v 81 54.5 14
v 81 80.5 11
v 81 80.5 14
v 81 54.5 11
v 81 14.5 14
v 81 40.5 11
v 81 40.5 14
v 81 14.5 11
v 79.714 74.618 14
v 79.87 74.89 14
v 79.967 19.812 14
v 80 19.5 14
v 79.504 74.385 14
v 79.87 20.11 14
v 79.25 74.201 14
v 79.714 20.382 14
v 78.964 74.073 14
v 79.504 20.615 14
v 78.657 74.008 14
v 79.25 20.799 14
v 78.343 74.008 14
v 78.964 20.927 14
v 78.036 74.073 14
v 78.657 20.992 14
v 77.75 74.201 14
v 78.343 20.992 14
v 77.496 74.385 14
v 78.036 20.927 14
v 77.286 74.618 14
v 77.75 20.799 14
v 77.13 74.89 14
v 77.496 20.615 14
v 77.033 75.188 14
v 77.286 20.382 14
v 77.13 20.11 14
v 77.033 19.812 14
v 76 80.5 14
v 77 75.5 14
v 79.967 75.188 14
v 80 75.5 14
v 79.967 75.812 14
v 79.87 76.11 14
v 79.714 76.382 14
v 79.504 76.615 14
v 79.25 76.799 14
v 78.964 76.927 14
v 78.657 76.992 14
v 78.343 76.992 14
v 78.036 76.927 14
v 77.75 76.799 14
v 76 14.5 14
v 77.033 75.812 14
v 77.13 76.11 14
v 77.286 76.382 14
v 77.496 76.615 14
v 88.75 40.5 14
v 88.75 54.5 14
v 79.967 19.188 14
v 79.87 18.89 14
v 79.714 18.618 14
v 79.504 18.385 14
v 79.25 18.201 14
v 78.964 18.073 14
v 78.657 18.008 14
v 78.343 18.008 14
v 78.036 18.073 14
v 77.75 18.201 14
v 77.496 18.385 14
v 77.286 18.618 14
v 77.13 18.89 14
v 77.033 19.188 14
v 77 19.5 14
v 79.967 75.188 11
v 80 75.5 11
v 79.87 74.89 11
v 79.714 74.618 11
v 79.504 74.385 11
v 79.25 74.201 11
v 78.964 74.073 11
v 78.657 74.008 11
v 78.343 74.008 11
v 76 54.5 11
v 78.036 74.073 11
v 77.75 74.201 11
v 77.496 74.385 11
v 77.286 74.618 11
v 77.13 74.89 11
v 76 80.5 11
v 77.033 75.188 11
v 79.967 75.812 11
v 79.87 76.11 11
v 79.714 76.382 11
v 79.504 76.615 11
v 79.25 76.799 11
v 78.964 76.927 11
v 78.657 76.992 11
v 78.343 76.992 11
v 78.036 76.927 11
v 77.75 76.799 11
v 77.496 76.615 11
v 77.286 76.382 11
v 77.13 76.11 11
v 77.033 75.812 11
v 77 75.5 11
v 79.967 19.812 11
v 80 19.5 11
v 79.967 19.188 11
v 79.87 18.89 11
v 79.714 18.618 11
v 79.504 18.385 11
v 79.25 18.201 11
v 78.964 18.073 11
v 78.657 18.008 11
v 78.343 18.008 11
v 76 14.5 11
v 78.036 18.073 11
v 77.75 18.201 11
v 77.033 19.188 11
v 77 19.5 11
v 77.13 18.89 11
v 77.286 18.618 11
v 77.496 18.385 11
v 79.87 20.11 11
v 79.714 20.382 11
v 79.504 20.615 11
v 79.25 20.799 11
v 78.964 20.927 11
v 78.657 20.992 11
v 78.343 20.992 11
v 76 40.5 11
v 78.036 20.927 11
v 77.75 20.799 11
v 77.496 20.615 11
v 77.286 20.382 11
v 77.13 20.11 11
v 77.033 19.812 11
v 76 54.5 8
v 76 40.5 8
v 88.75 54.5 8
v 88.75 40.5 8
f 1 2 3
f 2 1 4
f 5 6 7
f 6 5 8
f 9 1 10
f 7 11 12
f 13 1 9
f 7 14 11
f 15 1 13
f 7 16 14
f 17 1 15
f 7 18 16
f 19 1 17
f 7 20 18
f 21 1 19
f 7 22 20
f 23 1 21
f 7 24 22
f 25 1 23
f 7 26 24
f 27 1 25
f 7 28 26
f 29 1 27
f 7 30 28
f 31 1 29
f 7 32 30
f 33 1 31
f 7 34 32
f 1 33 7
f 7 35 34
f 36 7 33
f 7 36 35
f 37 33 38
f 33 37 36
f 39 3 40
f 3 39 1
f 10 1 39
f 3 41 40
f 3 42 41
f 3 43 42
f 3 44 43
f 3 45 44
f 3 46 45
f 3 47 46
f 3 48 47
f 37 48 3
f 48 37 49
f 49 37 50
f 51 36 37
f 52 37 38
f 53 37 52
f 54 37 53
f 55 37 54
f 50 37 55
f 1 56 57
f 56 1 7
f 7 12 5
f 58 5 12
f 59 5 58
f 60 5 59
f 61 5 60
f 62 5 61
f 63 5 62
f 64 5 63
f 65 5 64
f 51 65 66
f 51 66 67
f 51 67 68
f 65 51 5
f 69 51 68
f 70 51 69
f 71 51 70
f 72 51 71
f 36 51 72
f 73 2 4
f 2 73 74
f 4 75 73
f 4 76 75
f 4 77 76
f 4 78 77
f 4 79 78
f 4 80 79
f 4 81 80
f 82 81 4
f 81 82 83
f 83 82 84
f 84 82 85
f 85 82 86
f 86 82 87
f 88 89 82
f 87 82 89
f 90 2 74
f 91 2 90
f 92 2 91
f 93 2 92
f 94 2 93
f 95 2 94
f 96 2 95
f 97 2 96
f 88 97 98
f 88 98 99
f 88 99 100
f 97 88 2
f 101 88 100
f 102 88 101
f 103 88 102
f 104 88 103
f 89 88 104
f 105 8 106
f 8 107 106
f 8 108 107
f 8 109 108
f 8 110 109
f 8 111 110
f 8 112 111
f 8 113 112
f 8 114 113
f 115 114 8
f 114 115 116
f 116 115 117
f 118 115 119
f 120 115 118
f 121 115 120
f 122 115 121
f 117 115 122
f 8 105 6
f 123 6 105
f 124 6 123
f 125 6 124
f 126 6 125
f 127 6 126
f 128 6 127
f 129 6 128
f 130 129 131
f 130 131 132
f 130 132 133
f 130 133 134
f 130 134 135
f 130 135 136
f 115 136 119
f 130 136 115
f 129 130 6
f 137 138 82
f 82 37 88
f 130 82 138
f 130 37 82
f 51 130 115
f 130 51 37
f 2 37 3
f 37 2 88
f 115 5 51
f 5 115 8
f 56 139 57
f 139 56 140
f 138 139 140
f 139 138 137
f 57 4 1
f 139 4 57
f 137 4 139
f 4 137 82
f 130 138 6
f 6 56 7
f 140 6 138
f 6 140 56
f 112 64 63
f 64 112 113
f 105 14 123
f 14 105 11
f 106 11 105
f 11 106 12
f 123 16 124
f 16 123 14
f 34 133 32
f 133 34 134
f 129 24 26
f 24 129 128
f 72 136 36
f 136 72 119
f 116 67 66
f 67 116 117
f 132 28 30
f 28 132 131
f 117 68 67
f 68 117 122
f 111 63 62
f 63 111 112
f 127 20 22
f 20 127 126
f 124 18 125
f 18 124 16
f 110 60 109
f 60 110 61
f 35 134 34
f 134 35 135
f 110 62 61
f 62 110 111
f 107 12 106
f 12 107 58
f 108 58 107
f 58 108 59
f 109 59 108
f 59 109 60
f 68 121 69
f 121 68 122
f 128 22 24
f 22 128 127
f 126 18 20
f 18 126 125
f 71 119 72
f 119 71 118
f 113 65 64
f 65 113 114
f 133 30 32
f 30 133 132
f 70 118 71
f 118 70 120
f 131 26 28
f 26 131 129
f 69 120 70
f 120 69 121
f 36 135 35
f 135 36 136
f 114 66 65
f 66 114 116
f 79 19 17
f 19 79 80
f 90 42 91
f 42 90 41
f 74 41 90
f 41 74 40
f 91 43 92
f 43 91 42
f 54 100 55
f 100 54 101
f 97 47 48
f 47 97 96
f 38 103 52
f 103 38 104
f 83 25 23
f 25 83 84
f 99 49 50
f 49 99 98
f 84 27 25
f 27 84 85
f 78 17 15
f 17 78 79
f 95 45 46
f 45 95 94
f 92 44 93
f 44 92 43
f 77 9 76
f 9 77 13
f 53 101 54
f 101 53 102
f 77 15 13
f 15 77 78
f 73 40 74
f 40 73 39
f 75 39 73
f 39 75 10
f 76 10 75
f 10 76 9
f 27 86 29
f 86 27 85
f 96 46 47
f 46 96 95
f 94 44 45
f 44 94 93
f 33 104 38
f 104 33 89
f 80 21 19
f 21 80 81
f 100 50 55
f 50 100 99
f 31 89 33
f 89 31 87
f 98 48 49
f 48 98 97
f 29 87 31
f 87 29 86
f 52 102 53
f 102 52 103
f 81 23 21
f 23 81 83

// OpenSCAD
r = 7;
iw = 136;
ih = 95;
id = 8;

ow = 159.5+1.25;
oh = 109.5+1.25;
od = 3;

sw = 51;
sh = 28;
sd = 6;
st = 4;

hw = 5;
hh = sw+15;
hd = 3;

pw = sw/4;
ph = sh/2;
pd = 3;

/*
union() {
	difference() {
		union() {
			union() {
				translate( [0,r,0] ) cube( [iw, ih-2*r, id] );
				translate( [r,0,0] ) cube( [iw-2*r, ih, id] );
				translate( [r,r,0] ) cylinder( r=r, h=id, $fn=32 );
				translate( [iw-r,r,0] ) cylinder( r=r, h=id, $fn=32 );
				translate( [r,ih-r,0] ) cylinder( r=r, h=id, $fn=32 );
				translate( [iw-r,ih-r,0] ) cylinder( r=r, h=id, $fn=32 );
			}
			
			translate( [(iw-ow)/2,(ih-oh)/2,id] )
			union() {
				translate( [0,r,0] ) cube( [ow, oh-2*r, od] );
				translate( [r,0,0] ) cube( [ow-2*r, oh, od] );
				translate( [r,r,0] ) cylinder( r=r, h=od, $fn=32 );
				translate( [ow-r,r,0] ) cylinder( r=r, h=od, $fn=32 );
				translate( [r,oh-r,0] ) cylinder( r=r, h=od, $fn=32 );
				translate( [ow-r,oh-r,0] ) cylinder( r=r, h=od, $fn=32 );
			}
		}
	
		translate([(iw-sw)/2,(ih-sh)/2,-1])
		cube( [ sw+st+1, sh+st+1, id+od+2 ] );

		for( x=[0:7.5:sw+5] ) {
			translate([x+(iw-sw)/2,(ih-hh)/2+5,-1]) cylinder( r=1.5, h=100, $fn=30 );
			translate([x+(iw-sw)/2,(ih-hh)/2+hh-5,-1]) cylinder( r=1.5, h=100, $fn=30 );
		}
	}
	
	translate([(iw-sw)/2,(ih-sh)/2,0]) cylinder( r=3, h=2 );
	translate([(iw-sw)/2+sw+st+1,(ih-sh)/2,0]) cylinder( r=3, h=2 );
	translate([(iw-sw)/2,(ih-sh)/2+sh+st+1,0]) cylinder( r=3, h=2 );
	translate([(iw-sw)/2+sw+st+1,(ih-sh)/2+sh+st+1,0]) cylinder( r=3, h=2 );
}



translate([(iw-sw)/2,(ih-sh)/2,2])
union() {
	difference() {
		cube( [sw+st,sh+st,sd] );
		translate([st/2,st/2,1]) cube( [sw,sh,sd] );
		translate([st/2,6+st/2,-1]) cube( [30,13,10] );
	}
	translate( [8.3+st/2,22+st/2,0] ) cylinder( r=1.5, h=4, $fn=32 );
	translate( [23.3+st/2,22+st/2,0] ) cylinder( r=1.5, h=4, $fn=32 );
	translate( [25+st/2,0.6+st/2,0] ) cylinder( r=1.7, h=4, $fn=32 );
}

*/

translate( [(iw-ph)/2+15,(ih-hh)/2,id+od] ) 
difference() {
	union() {
		cube( [hw,hh,hd] );
		translate( [hw-hw,(hh-ph)/2,-pd] )
		cube( [pw,ph,pd+hd] );
	}
	translate( [hw/2,5,-1] )
	cylinder( r=1.5, h=hd+2, $fn=30 );

	translate( [hw/2,hh-5,-1] )
	cylinder( r=1.5, h=hd+2, $fn=30 );
}
